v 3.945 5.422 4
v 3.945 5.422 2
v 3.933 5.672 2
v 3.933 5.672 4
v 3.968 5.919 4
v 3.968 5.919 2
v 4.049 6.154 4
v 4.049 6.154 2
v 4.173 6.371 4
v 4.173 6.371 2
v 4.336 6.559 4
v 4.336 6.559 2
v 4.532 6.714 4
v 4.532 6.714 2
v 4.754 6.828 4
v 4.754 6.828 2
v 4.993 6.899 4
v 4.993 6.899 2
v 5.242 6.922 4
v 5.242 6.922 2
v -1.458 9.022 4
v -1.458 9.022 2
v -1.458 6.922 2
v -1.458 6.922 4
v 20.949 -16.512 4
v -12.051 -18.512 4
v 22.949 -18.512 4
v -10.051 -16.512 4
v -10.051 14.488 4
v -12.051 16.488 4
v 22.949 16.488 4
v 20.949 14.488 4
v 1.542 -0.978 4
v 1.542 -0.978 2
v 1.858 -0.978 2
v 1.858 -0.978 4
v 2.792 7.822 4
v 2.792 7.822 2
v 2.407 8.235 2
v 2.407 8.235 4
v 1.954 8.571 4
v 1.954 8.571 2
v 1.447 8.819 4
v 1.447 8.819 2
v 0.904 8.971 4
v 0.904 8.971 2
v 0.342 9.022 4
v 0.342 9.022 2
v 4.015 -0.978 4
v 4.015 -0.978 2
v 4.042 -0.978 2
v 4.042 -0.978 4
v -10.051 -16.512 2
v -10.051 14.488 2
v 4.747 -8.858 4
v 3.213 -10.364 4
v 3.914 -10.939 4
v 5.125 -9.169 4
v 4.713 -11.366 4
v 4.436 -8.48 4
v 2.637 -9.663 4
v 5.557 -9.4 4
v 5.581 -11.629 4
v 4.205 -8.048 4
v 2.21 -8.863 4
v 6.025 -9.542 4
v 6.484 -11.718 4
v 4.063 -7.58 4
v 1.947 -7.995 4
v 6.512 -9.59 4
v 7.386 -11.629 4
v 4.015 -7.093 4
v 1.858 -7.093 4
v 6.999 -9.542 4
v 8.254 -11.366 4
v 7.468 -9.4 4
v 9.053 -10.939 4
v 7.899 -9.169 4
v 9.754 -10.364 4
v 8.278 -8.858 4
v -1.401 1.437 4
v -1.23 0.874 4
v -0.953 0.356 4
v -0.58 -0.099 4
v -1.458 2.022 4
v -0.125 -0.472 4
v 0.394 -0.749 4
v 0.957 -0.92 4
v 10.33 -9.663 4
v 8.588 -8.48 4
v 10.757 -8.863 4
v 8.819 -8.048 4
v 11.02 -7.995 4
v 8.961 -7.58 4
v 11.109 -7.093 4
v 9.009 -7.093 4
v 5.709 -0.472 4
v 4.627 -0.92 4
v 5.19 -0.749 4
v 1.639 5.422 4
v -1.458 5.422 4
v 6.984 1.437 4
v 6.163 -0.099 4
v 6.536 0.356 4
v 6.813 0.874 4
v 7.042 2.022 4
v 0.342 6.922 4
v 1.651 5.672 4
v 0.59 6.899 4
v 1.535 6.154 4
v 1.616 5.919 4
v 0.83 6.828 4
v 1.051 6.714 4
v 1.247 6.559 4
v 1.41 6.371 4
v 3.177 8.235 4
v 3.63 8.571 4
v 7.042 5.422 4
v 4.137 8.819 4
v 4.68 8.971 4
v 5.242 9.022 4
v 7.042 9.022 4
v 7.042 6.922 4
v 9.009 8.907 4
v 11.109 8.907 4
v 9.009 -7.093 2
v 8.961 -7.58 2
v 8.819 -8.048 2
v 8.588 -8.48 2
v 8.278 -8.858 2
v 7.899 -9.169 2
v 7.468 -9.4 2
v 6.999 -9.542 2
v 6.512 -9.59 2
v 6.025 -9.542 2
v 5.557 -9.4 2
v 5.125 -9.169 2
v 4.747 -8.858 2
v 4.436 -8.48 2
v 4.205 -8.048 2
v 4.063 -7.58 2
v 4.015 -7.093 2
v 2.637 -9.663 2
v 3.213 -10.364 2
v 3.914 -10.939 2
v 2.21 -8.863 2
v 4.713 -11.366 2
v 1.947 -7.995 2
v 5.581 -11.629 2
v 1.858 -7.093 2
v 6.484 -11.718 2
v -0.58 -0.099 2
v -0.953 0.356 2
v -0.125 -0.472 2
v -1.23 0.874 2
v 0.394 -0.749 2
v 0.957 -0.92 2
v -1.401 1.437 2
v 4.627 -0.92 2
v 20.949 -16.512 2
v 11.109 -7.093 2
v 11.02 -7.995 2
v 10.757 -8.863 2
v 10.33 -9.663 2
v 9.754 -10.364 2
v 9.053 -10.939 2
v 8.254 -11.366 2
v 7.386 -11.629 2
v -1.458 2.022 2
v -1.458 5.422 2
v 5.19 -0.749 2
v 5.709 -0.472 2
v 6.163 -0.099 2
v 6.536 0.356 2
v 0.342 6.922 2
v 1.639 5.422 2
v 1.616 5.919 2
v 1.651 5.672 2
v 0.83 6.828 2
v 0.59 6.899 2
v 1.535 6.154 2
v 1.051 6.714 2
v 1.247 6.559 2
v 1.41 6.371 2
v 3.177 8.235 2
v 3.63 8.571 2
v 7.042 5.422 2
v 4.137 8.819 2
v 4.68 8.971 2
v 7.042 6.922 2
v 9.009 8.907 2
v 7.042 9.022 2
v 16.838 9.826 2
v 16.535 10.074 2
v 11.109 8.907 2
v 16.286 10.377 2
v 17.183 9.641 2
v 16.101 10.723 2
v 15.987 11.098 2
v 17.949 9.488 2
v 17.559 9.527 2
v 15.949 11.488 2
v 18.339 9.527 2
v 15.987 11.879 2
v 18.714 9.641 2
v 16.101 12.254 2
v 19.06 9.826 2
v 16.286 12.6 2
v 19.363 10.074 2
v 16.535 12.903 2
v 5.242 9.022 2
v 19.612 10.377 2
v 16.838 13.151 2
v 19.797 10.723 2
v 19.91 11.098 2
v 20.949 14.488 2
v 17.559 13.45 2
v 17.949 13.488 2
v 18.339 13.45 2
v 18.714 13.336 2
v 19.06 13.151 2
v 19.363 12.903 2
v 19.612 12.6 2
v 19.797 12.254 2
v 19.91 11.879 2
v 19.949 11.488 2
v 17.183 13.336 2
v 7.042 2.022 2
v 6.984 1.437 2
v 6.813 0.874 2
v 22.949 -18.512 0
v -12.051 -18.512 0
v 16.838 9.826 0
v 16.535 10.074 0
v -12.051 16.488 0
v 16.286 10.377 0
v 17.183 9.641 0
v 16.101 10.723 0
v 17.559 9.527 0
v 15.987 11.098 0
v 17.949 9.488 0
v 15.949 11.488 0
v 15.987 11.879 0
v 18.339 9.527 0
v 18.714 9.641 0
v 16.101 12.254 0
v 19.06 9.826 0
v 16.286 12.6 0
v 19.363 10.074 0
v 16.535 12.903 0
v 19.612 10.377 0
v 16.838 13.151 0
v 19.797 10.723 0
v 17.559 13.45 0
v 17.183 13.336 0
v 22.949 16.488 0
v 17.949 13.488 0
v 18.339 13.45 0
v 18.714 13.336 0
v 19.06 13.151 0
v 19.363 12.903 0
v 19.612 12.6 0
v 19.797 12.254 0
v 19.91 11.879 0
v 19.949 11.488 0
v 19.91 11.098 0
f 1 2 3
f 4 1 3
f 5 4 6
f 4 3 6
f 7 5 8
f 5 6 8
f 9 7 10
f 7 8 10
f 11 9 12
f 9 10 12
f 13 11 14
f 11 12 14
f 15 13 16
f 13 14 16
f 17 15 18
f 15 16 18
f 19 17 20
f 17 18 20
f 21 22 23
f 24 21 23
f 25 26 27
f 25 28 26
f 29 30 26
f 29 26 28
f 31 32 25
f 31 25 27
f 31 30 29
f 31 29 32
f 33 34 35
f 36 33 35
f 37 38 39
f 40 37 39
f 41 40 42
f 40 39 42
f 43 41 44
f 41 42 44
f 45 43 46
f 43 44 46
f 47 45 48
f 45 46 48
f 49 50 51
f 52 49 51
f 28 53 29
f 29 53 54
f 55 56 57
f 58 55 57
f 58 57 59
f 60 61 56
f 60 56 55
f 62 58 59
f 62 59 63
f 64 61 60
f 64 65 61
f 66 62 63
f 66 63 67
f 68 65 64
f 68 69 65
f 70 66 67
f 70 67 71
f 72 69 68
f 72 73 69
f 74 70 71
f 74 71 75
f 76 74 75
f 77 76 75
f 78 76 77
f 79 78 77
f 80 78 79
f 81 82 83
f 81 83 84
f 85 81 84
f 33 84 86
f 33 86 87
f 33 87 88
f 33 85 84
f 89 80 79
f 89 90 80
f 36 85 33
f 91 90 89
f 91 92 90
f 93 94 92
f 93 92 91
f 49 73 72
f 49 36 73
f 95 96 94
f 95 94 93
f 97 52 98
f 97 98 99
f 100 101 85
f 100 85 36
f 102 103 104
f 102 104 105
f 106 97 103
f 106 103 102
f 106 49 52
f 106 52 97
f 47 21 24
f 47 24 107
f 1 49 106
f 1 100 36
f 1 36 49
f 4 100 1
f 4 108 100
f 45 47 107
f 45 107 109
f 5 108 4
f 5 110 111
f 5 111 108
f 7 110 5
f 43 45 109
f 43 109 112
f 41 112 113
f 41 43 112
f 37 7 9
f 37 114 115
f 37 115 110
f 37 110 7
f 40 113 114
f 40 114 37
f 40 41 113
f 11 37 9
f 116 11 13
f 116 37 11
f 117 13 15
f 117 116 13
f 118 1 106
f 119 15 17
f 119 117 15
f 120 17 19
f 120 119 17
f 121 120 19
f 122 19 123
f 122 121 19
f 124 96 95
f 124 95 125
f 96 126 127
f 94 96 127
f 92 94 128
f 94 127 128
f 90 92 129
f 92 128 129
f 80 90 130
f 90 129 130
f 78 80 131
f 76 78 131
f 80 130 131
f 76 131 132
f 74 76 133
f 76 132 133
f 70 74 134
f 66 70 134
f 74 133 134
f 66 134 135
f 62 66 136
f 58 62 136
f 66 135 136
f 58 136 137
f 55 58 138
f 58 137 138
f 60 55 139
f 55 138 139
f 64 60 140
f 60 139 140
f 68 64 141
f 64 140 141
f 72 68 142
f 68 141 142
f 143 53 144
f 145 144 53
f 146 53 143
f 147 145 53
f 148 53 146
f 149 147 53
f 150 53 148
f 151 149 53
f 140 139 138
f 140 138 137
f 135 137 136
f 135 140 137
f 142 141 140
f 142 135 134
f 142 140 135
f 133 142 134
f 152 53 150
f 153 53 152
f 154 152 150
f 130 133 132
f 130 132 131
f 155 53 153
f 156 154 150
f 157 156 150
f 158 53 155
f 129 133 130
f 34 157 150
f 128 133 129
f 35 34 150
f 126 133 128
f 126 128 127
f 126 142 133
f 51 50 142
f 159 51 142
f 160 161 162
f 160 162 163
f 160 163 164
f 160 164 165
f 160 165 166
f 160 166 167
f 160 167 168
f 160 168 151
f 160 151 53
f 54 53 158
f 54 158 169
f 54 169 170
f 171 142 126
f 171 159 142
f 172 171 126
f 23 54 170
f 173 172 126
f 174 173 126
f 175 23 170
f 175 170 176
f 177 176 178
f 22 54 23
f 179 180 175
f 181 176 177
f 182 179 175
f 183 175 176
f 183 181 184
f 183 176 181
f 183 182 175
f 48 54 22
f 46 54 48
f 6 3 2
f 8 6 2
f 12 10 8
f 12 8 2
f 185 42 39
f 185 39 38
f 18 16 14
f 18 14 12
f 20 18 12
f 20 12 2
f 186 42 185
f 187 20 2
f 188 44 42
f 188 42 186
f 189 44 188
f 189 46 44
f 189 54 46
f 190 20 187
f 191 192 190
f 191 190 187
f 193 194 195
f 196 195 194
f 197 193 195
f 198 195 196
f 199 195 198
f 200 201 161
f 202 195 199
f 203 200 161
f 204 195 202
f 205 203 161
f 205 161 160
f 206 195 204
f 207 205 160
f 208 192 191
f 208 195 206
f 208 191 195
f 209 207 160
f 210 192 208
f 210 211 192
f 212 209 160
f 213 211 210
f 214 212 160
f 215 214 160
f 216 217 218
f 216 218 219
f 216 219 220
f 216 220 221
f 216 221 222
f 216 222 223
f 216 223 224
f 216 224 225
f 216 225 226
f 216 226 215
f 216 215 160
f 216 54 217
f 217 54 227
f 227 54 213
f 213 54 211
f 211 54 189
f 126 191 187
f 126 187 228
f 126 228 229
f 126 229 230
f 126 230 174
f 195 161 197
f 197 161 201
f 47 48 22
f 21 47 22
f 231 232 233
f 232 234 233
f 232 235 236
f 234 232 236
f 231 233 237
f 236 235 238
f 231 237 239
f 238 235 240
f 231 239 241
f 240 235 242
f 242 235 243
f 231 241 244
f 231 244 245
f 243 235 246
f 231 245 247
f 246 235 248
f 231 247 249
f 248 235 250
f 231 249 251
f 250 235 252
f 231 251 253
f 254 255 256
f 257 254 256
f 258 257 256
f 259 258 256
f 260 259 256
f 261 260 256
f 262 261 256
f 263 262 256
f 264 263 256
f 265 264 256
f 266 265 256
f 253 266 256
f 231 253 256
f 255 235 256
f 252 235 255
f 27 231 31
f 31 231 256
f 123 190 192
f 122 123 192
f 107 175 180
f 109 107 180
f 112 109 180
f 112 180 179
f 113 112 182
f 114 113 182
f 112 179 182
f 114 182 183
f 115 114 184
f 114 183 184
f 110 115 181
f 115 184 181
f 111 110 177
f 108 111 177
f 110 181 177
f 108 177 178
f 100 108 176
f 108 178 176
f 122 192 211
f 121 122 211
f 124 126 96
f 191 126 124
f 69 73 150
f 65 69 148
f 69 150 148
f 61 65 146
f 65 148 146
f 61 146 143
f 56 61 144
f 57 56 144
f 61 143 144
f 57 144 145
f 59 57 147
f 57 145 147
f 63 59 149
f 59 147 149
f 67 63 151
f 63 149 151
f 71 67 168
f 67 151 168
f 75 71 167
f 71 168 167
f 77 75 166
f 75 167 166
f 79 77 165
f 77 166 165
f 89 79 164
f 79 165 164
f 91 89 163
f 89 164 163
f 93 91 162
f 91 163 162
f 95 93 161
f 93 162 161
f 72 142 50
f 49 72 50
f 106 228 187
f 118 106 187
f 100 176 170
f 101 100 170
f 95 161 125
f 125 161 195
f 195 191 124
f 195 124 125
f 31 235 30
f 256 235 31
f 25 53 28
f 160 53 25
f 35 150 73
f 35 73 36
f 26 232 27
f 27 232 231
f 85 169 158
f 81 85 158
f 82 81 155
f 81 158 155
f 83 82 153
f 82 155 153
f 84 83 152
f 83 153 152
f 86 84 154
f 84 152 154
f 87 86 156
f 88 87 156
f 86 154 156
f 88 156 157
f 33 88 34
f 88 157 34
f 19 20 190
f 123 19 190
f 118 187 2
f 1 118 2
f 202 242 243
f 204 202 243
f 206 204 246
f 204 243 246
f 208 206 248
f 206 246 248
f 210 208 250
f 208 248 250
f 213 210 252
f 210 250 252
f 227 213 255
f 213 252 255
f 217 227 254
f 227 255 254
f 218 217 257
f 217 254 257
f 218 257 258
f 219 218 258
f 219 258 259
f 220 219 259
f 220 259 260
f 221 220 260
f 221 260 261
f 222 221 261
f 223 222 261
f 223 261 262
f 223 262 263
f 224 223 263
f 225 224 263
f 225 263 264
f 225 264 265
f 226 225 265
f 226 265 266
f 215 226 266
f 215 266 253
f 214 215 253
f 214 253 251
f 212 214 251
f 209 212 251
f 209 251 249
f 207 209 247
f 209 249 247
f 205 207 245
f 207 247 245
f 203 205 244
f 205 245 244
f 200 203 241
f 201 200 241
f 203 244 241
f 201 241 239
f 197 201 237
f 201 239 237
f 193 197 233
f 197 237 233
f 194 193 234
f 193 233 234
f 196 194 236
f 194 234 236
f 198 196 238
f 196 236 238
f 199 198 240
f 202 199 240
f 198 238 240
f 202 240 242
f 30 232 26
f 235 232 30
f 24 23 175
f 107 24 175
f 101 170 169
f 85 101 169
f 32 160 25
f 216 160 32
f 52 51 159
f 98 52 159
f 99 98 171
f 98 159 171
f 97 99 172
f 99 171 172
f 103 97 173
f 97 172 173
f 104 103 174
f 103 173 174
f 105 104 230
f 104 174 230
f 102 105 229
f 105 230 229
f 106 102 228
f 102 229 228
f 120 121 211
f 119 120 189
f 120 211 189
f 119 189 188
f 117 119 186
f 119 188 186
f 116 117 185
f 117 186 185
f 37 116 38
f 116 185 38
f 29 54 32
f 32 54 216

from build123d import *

# Parameters (mm, degrees)
F0_W     = 35
F0_H     = 35
F0_W_2   = 31
F0_H_2   = 31
F1_DEPTH = 4
F0_W_3   = 2.1
F0_H_3   = 16
F0_W_4   = 2.1574016428
F0_H_4   = 6.115043208
F2_DEPTH = 2
F4_D     = 4


with BuildPart() as f1:
    # F0 (on Top) → F1 (new body)
    with BuildSketch(Plane.XY):
        with Locations((5.448846221, -1.0115454492)):
            Rectangle(F0_W, F0_H)
        with Locations((5.448846221, -1.0115454492)):
            Rectangle(F0_W_2, F0_H_2, mode=Mode.SUBTRACT)
    extrude(amount=F1_DEPTH)



with BuildPart() as f1b:
    # F0 (on Top) → F1, piece 2 (new body)
    with BuildSketch(Plane.XY):
        with BuildLine():
            Line((1.8578098388, -0.9776405059), (4.0152114816, -0.9776405059))
            Line((4.0152114816, -0.9776405059), (4.0418037977, -0.9776405059))
            ThreePointArc((4.0418037977, -0.9776405059), (6.1631241413, -0.0989608494), (7.0418037977, 2.0223594941))
            Line((7.0418037977, 2.0223594941), (7.0418037977, 5.4223594941))
            Line((7.0418037977, 5.4223594941), (3.9449525066, 5.4223594941))
            Line((3.9449525066, 5.4223594941), (2.7918037977, 5.4223594941))
            Line((2.7918037977, 5.4223594941), (1.6386550888, 5.4223594941))
            Line((1.6386550888, 5.4223594941), (-1.4581962023, 5.4223594941))
            Line((-1.4581962023, 5.4223594941), (-1.4581962023, 2.0223594941))
            ThreePointArc((-1.4581962023, 2.0223594941), (-0.5795165459, -0.0989608494), (1.5418037977, -0.9776405059))
            Line((1.5418037977, -0.9776405059), (1.8578098388, -0.9776405059))
        make_face()
        with BuildLine():
            ThreePointArc((0.3418037977, 6.9223594941), (1.3332450808, 6.4689196757), (1.6386550888, 5.4223594941))
            Line((1.6386550888, 5.4223594941), (2.7918037977, 5.4223594941))
            Line((2.7918037977, 5.4223594941), (2.7918037977, 7.8223594941))
            ThreePointArc((2.7918037977, 7.8223594941), (1.7058510843, 8.7062477042), (0.3418037977, 9.0223594941))
            Line((0.3418037977, 9.0223594941), (-1.4581962023, 9.0223594941))
            Line((-1.4581962023, 9.0223594941), (-1.4581962023, 6.9223594941))
            Line((-1.4581962023, 6.9223594941), (0.3418037977, 6.9223594941))
        make_face()
        with BuildLine():
            Line((2.7918037977, 5.4223594941), (3.9449525066, 5.4223594941))
            ThreePointArc((3.9449525066, 5.4223594941), (4.2503625146, 6.4689196757), (5.2418037977, 6.9223594941))
            Line((5.2418037977, 6.9223594941), (7.0418037977, 6.9223594941))
            Line((7.0418037977, 6.9223594941), (7.0418037977, 9.0223594941))
            Line((7.0418037977, 9.0223594941), (5.2418037977, 9.0223594941))
            ThreePointArc((5.2418037977, 9.0223594941), (3.8777565111, 8.7062477042), (2.7918037977, 7.8223594941))
            Line((2.7918037977, 7.8223594941), (2.7918037977, 5.4223594941))
        make_face()
        with Locations((10.0591945603, 0.9073162861)):
            Rectangle(F0_W_3, F0_H_3)
        with BuildLine():
            Line((11.1091945603, -7.0926837139), (9.0091945603, -7.0926837139))
            ThreePointArc((9.0091945603, -7.0926837139), (6.512203021, -9.5896752533), (4.0152114816, -7.0926837139))
            Line((4.0152114816, -7.0926837139), (1.8578098388, -7.0926837139))
            ThreePointArc((1.8578098388, -7.0926837139), (6.4835021996, -11.7183760746), (11.1091945603, -7.0926837139))
        make_face()
        with Locations((2.9365106602, -4.0351621099)):
            Rectangle(F0_W_4, F0_H_4)
    extrude(amount=F1_DEPTH)


with BuildPart() as f1_1:
    add(f1.part)

    add(f1b.part)  # F2 merges F1b
    # F0 (on Top) → F2 (join)
    with BuildSketch(Plane.XY):
        with Locations((5.448846221, -1.0115454492)):
            Rectangle(F0_W_2, F0_H_2)
        with BuildLine():
            Line((9.0091945603, -7.0926837139), (9.0091945603, 8.9073162861))
            Line((9.0091945603, 8.9073162861), (11.1091945603, 8.9073162861))
            Line((11.1091945603, 8.9073162861), (11.1091945603, -7.0926837139))
            ThreePointArc((11.1091945603, -7.0926837139), (6.4835021996, -11.7183760746), (1.8578098388, -7.0926837139))
            Line((1.8578098388, -7.0926837139), (1.8578098388, -0.9776405059))
            Line((1.8578098388, -0.9776405059), (1.5418037977, -0.9776405059))
            ThreePointArc((1.5418037977, -0.9776405059), (-0.5795165459, -0.0989608494), (-1.4581962023, 2.0223594941))
            Line((-1.4581962023, 2.0223594941), (-1.4581962023, 5.4223594941))
            Line((-1.4581962023, 5.4223594941), (1.6386550888, 5.4223594941))
            ThreePointArc((1.6386550888, 5.4223594941), (1.3332450808, 6.4689196757), (0.3418037977, 6.9223594941))
            Line((0.3418037977, 6.9223594941), (-1.4581962023, 6.9223594941))
            Line((-1.4581962023, 6.9223594941), (-1.4581962023, 9.0223594941))
            Line((-1.4581962023, 9.0223594941), (0.3418037977, 9.0223594941))
            ThreePointArc((0.3418037977, 9.0223594941), (1.7058510843, 8.7062477042), (2.7918037977, 7.8223594941))
            ThreePointArc((2.7918037977, 7.8223594941), (3.8777565111, 8.7062477042), (5.2418037977, 9.0223594941))
            Line((5.2418037977, 9.0223594941), (7.0418037977, 9.0223594941))
            Line((7.0418037977, 9.0223594941), (7.0418037977, 6.9223594941))
            Line((7.0418037977, 6.9223594941), (5.2418037977, 6.9223594941))
            ThreePointArc((5.2418037977, 6.9223594941), (4.2503625146, 6.4689196757), (3.9449525066, 5.4223594941))
            Line((3.9449525066, 5.4223594941), (7.0418037977, 5.4223594941))
            Line((7.0418037977, 5.4223594941), (7.0418037977, 2.0223594941))
            ThreePointArc((7.0418037977, 2.0223594941), (6.1631241413, -0.0989608494), (4.0418037977, -0.9776405059))
            Line((4.0418037977, -0.9776405059), (4.0152114816, -0.9776405059))
            Line((4.0152114816, -0.9776405059), (4.0152114816, -7.0926837139))
            ThreePointArc((4.0152114816, -7.0926837139), (6.512203021, -9.5896752533), (9.0091945603, -7.0926837139))
        make_face(mode=Mode.SUBTRACT)
    extrude(amount=F2_DEPTH)

    # F4 (through all)
    with Locations(Plane.XY.offset(2)):
        with Locations((17.948846221, 11.4884545508)):
            Hole(F4_D / 2)


solid = f1_1.part
